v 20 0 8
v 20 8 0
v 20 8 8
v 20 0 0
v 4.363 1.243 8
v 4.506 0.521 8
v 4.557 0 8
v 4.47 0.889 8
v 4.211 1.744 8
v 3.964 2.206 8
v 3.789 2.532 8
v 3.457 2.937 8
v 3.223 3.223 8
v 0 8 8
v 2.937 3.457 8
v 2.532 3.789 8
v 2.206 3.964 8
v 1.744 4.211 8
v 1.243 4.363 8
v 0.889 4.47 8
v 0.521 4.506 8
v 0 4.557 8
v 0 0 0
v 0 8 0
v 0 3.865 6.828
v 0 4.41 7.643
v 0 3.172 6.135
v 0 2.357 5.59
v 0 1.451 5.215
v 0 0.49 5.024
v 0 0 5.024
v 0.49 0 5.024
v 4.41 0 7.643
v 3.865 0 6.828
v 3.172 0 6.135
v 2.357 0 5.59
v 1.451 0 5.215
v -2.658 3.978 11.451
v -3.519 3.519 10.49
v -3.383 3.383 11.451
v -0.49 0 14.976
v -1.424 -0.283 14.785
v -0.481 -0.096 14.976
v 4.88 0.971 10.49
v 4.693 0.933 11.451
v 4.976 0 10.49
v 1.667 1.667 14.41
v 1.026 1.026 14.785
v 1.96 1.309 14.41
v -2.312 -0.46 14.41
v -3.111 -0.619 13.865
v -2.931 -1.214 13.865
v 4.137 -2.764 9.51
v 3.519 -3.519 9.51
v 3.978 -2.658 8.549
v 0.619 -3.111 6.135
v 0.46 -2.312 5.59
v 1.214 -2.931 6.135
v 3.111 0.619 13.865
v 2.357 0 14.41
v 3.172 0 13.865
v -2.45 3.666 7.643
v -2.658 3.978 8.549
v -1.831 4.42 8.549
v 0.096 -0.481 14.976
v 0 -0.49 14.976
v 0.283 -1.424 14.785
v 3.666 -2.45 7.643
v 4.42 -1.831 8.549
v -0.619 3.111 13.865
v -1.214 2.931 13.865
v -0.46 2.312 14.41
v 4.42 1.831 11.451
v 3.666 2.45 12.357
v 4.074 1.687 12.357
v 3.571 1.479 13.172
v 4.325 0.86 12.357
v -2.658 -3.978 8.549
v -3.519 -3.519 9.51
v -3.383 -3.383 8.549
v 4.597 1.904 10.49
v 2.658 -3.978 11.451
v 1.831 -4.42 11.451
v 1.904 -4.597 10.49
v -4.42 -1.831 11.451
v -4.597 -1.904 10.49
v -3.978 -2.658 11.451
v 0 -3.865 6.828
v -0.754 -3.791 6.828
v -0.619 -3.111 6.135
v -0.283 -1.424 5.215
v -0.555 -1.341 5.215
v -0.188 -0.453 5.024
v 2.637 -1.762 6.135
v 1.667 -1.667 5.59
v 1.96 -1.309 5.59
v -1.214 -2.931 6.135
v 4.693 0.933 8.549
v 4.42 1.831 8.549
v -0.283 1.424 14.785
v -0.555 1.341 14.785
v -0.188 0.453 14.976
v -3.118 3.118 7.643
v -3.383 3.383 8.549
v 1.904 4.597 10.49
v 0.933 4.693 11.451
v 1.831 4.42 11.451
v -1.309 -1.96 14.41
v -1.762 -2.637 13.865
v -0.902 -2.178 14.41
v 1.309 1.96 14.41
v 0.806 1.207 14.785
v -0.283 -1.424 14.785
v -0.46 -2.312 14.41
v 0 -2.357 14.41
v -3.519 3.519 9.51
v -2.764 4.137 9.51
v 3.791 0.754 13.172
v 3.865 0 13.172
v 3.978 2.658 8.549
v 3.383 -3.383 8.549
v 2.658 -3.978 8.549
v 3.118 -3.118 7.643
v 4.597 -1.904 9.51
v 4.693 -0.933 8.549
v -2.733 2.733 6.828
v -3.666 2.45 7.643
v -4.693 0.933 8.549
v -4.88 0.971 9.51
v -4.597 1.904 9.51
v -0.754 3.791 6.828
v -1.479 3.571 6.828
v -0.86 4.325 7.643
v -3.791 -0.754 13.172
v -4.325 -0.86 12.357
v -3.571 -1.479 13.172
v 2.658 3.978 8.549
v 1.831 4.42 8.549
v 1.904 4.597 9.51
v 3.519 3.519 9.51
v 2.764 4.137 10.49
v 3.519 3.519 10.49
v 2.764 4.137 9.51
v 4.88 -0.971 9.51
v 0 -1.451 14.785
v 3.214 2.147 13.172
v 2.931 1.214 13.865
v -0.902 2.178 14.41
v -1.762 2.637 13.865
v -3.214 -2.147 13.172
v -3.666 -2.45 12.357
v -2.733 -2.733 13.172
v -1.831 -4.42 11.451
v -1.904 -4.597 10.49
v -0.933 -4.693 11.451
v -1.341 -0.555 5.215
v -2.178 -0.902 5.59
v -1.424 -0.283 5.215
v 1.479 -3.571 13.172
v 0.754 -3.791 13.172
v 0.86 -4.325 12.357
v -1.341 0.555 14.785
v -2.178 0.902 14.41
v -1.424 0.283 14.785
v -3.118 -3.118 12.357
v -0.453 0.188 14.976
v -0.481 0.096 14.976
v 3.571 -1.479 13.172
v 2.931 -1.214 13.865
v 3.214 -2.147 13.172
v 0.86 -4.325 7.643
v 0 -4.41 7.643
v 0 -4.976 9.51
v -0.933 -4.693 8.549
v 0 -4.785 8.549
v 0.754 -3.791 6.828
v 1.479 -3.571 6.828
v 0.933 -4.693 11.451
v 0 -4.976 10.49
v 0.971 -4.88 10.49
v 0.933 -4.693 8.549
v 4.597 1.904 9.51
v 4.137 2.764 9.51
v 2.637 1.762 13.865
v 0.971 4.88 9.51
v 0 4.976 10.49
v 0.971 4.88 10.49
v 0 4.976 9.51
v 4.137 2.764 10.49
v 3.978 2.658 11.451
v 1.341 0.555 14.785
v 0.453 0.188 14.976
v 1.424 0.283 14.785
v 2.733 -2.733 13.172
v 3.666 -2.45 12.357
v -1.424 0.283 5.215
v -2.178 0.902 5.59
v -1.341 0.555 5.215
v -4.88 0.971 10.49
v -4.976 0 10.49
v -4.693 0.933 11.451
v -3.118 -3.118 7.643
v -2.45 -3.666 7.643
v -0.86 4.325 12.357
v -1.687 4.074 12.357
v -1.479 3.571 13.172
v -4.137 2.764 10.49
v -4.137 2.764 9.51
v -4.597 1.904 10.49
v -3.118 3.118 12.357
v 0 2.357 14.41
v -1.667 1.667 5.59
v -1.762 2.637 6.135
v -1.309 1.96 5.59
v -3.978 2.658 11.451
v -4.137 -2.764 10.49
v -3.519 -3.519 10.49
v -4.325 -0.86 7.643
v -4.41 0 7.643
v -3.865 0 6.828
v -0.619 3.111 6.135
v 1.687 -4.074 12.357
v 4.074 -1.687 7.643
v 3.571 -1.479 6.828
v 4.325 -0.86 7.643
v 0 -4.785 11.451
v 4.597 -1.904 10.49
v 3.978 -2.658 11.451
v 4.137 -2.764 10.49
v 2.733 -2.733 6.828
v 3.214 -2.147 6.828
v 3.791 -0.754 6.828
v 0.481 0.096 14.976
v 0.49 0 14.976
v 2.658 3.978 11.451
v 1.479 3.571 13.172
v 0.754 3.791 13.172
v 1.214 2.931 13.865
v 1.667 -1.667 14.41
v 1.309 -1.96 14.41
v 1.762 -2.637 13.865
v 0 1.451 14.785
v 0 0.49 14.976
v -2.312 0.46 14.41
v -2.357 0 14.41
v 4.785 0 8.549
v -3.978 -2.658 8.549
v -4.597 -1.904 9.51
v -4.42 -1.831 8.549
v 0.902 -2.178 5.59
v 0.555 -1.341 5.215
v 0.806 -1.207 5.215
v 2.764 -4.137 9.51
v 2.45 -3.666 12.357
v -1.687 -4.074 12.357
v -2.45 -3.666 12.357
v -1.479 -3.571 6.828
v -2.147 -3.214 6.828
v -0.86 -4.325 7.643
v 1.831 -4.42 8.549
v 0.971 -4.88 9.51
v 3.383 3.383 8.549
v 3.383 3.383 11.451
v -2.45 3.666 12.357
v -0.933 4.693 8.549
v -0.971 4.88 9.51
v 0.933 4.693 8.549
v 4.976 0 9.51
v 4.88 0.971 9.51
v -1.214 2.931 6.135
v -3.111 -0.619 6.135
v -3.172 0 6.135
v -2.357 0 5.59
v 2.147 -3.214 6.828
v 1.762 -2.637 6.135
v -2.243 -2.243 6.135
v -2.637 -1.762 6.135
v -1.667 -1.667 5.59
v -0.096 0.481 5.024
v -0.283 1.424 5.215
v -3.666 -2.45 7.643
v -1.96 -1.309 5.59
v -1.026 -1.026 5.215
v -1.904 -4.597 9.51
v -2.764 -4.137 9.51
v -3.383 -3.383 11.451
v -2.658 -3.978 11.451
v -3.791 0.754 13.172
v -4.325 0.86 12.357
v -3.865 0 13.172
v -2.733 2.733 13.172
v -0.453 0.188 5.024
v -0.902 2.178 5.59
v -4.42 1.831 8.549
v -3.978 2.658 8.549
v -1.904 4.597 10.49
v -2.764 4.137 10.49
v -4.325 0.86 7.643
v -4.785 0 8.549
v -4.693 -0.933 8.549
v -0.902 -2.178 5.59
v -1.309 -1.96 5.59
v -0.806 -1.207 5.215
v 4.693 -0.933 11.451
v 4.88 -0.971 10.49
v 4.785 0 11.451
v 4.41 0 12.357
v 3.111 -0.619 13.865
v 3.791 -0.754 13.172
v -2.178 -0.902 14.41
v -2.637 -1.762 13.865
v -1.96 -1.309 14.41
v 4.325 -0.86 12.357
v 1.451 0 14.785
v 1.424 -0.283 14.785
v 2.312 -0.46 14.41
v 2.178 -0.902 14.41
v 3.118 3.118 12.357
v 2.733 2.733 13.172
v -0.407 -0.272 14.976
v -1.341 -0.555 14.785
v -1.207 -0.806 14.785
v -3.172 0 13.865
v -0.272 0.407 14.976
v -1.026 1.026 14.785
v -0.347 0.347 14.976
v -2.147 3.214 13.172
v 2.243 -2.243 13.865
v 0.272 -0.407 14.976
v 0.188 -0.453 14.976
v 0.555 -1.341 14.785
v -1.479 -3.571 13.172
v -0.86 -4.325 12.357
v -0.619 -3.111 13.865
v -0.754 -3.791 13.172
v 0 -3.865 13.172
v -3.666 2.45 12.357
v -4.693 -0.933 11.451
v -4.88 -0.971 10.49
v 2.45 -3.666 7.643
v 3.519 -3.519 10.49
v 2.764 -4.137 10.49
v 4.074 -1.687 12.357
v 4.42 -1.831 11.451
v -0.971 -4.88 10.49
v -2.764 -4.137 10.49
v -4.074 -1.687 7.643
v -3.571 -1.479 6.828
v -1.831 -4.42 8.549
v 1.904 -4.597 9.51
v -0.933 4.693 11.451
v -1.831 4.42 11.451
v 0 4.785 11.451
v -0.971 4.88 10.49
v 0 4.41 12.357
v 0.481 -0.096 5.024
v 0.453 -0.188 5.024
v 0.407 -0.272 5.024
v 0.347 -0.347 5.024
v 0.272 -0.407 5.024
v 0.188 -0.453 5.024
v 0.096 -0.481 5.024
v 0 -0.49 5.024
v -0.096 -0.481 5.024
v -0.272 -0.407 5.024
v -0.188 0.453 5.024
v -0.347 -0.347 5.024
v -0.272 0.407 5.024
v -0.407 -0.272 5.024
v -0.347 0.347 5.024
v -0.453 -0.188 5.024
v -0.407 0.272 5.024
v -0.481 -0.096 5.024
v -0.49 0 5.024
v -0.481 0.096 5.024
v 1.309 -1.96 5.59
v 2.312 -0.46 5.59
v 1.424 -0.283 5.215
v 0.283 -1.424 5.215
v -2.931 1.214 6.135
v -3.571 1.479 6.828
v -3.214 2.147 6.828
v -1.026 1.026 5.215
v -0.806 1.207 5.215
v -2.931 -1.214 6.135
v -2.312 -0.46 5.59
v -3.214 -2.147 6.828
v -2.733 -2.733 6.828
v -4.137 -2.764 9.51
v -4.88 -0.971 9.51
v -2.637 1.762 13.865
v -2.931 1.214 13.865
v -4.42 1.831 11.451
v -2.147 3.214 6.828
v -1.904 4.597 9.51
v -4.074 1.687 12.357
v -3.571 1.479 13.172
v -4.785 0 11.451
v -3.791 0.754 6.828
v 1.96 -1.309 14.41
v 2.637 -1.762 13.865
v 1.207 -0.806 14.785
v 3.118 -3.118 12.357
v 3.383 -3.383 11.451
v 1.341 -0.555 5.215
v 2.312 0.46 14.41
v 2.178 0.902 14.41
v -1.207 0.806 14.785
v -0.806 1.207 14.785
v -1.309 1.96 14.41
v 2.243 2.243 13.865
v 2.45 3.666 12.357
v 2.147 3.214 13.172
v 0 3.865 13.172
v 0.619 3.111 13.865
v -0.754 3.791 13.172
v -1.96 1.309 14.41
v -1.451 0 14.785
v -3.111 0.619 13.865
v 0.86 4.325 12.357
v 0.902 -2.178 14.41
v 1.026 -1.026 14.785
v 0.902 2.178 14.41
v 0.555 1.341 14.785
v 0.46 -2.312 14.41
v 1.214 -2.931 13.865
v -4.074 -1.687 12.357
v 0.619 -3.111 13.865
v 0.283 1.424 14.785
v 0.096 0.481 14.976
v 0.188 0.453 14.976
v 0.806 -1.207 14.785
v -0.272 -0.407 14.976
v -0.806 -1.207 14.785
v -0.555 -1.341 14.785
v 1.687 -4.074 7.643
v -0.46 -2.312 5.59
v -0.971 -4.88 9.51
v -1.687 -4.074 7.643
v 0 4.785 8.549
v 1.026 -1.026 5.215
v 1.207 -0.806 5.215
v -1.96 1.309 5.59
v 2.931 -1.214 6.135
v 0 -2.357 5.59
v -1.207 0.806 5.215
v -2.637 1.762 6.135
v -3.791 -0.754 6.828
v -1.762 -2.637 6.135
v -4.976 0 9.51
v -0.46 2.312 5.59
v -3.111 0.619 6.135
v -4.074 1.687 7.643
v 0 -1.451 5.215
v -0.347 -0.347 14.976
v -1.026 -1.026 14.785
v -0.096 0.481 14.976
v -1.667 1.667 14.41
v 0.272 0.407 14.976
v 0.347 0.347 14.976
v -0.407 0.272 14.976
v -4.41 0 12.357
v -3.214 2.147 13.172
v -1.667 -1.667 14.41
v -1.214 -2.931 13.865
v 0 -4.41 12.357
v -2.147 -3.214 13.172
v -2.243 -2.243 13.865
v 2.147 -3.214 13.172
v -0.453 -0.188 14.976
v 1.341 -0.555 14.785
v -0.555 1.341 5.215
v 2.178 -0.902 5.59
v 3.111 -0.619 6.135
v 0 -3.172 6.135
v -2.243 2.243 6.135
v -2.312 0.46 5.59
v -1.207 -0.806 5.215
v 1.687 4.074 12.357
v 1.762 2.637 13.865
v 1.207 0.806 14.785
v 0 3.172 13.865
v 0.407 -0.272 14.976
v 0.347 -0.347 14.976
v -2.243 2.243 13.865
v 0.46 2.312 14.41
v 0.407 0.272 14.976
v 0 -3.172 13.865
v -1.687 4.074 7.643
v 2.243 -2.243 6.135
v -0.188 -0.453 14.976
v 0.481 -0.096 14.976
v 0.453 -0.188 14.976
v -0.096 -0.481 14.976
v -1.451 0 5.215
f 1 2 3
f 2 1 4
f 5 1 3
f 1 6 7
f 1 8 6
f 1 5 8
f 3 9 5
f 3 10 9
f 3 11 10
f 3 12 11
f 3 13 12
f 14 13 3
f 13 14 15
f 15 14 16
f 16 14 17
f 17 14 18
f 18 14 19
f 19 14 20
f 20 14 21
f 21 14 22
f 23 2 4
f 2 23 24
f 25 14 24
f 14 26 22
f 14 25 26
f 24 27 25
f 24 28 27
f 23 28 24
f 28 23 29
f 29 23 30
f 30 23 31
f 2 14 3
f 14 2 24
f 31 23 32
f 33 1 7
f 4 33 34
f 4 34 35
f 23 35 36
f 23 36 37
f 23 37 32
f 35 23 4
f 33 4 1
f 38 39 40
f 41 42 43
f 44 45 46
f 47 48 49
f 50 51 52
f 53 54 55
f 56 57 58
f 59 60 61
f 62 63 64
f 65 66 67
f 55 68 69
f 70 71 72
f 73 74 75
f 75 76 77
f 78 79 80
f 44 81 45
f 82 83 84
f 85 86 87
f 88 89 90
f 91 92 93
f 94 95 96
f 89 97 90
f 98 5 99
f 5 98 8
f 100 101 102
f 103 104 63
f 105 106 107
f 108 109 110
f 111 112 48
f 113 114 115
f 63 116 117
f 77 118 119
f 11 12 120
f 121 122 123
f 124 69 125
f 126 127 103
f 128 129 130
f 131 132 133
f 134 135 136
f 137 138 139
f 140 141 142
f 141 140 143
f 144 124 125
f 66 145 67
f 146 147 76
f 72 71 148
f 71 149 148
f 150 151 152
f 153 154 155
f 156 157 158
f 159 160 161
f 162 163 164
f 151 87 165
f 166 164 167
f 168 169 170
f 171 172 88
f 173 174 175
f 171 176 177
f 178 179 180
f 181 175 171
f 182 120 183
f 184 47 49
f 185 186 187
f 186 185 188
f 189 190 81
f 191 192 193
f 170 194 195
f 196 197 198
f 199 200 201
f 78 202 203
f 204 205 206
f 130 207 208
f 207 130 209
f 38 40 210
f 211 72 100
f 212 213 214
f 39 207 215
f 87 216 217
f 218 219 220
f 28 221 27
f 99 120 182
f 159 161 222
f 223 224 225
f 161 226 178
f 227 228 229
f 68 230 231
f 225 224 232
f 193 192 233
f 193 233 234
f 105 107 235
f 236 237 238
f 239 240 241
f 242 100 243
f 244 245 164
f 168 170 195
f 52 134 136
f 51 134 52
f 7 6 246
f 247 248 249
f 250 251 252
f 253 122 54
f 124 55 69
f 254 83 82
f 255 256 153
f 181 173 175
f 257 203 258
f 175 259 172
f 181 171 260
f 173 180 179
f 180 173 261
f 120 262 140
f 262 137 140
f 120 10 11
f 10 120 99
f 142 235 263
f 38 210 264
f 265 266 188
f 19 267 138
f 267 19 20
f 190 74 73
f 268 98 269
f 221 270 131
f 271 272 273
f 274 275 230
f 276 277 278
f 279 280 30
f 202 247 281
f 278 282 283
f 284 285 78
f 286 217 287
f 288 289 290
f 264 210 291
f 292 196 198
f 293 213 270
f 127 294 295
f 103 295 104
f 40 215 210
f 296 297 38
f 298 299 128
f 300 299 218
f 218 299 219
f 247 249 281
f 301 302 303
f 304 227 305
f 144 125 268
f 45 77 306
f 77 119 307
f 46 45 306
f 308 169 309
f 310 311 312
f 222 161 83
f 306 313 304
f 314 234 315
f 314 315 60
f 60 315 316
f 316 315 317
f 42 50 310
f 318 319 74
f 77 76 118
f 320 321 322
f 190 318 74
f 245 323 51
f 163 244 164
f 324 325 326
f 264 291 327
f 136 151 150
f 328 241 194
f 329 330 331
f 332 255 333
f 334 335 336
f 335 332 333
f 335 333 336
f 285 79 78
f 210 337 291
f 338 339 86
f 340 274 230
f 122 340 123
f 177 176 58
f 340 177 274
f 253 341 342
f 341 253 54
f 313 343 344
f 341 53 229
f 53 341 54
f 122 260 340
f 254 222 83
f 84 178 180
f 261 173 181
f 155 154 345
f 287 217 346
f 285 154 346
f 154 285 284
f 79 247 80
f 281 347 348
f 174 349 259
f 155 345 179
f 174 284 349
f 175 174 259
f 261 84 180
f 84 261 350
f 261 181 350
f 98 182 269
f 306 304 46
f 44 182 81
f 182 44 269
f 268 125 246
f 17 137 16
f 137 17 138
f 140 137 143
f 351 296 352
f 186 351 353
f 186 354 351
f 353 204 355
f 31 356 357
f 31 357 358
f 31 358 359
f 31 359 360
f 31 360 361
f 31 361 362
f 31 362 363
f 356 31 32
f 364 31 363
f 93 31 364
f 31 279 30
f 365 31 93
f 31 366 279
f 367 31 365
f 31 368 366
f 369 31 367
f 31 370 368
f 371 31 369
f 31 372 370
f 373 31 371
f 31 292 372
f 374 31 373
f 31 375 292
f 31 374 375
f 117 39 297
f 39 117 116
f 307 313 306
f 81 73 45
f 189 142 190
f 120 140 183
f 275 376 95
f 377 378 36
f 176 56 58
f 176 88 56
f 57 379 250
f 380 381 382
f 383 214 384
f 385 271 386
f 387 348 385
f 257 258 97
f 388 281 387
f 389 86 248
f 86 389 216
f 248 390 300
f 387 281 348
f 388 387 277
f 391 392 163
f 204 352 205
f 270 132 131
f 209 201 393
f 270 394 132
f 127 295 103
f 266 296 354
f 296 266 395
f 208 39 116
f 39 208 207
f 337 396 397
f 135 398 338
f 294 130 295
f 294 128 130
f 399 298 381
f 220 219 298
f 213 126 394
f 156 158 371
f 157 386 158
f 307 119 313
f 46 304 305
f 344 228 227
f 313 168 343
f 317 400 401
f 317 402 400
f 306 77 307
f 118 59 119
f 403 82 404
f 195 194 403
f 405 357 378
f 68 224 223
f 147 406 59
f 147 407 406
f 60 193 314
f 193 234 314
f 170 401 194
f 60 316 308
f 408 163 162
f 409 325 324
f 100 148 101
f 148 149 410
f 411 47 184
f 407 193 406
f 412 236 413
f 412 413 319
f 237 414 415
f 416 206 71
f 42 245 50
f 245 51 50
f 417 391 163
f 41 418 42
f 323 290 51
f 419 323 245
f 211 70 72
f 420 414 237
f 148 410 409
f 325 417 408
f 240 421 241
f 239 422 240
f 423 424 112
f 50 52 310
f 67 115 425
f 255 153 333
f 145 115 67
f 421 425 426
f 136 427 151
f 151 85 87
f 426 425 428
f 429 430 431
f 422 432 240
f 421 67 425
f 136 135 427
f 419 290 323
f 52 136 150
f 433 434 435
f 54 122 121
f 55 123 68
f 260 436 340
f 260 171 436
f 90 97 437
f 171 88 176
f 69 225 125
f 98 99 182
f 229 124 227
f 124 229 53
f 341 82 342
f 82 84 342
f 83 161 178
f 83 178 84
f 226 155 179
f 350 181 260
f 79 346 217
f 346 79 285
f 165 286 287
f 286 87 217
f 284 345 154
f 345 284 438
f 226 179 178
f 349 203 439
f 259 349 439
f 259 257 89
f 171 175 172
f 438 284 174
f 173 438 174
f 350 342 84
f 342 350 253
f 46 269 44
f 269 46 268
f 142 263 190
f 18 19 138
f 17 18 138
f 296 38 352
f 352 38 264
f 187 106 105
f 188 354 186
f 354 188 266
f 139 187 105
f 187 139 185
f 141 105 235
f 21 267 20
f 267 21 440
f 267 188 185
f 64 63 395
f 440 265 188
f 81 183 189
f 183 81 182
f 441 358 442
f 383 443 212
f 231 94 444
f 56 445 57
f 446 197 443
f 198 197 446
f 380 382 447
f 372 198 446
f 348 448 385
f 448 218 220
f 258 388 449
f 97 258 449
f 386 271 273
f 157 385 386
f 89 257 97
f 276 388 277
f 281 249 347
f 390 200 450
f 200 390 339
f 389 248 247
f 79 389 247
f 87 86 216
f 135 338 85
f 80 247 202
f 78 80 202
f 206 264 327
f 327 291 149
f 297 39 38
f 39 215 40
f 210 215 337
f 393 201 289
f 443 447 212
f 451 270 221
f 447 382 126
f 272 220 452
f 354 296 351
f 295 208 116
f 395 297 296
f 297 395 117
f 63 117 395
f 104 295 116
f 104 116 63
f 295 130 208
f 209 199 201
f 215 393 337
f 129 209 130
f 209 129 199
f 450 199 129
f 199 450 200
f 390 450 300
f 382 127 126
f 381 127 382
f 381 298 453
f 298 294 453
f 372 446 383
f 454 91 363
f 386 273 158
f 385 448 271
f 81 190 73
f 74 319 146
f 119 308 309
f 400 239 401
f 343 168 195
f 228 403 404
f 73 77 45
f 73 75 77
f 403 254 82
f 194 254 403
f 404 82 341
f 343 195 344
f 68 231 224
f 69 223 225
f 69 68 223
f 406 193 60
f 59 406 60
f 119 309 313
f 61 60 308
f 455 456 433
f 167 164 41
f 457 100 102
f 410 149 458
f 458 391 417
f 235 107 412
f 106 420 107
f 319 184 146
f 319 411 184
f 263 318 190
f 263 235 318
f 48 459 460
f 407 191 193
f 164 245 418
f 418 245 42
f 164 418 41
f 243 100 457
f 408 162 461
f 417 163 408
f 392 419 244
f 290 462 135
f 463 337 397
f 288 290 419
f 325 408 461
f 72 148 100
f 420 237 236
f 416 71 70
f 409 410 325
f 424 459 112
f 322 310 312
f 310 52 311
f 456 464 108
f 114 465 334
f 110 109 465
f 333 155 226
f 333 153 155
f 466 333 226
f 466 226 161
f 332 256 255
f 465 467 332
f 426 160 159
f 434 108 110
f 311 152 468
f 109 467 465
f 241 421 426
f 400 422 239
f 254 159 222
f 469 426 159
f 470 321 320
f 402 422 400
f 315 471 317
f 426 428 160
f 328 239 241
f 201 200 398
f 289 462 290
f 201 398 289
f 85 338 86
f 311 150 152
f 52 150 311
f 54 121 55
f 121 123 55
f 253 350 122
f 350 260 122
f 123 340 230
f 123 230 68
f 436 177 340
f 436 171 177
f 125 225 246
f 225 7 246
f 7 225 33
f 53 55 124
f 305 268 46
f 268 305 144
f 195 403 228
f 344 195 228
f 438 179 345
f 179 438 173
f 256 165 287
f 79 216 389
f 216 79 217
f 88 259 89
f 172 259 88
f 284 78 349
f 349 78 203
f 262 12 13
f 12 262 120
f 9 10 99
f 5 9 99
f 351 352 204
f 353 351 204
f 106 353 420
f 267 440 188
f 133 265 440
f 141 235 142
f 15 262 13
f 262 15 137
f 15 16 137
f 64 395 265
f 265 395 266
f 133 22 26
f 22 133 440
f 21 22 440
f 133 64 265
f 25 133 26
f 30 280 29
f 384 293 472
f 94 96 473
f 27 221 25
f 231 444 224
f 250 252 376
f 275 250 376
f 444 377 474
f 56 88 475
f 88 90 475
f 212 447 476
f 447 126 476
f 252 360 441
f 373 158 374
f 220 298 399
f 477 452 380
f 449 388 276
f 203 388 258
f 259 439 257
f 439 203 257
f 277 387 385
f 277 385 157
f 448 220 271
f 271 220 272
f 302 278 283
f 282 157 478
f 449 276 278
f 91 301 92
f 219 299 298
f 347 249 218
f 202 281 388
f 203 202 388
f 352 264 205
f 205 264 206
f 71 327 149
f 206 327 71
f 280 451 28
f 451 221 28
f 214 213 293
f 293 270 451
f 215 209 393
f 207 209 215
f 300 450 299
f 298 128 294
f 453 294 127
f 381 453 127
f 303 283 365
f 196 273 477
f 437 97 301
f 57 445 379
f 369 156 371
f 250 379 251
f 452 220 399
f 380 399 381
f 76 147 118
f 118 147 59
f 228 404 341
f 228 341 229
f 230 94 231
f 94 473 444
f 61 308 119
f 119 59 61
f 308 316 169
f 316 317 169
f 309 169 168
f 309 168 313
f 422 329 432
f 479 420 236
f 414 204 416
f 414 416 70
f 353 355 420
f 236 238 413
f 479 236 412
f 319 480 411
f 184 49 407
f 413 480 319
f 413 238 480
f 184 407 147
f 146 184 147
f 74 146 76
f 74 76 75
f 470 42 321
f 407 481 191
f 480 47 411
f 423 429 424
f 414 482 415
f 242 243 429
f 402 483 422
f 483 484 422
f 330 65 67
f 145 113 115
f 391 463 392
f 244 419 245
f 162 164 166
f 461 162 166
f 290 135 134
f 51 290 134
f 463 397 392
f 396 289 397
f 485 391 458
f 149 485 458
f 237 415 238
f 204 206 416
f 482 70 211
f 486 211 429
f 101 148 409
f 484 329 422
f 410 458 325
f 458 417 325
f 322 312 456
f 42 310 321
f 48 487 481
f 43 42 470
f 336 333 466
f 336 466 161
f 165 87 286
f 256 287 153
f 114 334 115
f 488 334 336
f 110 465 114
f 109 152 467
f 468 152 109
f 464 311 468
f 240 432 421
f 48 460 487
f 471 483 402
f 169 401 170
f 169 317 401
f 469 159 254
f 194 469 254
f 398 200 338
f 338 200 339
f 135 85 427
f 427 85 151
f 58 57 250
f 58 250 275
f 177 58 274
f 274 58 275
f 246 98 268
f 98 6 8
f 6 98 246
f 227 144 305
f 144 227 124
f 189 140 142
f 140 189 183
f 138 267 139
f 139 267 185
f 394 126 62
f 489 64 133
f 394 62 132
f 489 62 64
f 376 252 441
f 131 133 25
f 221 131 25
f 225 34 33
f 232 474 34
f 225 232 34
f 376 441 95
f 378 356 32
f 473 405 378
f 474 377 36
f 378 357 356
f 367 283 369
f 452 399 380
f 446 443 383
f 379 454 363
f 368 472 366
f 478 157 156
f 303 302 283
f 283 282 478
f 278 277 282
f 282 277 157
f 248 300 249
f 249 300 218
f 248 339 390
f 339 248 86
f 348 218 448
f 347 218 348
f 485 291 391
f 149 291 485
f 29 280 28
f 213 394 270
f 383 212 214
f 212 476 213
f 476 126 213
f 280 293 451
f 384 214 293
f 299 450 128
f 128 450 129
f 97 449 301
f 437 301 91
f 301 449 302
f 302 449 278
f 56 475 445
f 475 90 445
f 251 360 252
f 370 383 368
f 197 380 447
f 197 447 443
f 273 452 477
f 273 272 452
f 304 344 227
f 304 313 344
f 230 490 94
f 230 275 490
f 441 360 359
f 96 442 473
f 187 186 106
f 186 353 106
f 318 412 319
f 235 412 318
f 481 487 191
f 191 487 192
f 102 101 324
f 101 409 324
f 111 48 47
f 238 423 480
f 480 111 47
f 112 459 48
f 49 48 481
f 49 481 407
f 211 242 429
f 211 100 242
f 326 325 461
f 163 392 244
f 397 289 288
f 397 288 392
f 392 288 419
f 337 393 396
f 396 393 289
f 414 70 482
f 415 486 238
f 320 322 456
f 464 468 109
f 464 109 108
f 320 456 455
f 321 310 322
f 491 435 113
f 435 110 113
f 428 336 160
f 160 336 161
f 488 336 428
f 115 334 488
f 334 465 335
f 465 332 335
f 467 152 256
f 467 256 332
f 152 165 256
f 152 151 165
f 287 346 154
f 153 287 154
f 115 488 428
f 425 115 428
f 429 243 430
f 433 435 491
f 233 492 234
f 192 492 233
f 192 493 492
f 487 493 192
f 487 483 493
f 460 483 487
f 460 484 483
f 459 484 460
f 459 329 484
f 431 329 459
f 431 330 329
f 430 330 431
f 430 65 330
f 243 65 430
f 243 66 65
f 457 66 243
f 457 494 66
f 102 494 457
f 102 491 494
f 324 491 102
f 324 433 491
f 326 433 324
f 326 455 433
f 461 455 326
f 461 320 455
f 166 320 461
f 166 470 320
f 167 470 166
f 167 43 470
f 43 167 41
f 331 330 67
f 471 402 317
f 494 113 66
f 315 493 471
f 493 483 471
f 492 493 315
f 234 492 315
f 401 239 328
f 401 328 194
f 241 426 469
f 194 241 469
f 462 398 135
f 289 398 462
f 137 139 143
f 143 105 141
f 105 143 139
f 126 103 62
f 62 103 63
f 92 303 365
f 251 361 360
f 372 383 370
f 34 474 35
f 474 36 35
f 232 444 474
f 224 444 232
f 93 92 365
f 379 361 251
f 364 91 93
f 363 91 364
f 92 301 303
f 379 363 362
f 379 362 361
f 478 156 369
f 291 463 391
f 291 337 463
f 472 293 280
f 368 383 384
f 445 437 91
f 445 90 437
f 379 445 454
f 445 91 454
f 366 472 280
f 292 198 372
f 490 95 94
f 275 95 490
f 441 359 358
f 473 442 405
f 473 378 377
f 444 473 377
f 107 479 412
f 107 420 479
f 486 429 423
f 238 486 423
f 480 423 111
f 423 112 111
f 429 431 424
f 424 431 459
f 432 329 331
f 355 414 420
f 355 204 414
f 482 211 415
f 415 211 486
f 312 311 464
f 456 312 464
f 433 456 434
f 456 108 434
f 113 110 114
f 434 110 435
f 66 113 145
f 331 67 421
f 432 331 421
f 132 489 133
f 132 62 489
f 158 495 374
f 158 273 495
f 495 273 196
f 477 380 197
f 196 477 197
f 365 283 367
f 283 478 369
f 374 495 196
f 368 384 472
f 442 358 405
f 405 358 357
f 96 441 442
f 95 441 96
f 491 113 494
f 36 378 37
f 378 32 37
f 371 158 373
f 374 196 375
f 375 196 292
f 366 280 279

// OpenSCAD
rotate([0,0,$t*360]) cube([20,8,8]); translate([0,0,10]) sphere(5,$fn=32);
